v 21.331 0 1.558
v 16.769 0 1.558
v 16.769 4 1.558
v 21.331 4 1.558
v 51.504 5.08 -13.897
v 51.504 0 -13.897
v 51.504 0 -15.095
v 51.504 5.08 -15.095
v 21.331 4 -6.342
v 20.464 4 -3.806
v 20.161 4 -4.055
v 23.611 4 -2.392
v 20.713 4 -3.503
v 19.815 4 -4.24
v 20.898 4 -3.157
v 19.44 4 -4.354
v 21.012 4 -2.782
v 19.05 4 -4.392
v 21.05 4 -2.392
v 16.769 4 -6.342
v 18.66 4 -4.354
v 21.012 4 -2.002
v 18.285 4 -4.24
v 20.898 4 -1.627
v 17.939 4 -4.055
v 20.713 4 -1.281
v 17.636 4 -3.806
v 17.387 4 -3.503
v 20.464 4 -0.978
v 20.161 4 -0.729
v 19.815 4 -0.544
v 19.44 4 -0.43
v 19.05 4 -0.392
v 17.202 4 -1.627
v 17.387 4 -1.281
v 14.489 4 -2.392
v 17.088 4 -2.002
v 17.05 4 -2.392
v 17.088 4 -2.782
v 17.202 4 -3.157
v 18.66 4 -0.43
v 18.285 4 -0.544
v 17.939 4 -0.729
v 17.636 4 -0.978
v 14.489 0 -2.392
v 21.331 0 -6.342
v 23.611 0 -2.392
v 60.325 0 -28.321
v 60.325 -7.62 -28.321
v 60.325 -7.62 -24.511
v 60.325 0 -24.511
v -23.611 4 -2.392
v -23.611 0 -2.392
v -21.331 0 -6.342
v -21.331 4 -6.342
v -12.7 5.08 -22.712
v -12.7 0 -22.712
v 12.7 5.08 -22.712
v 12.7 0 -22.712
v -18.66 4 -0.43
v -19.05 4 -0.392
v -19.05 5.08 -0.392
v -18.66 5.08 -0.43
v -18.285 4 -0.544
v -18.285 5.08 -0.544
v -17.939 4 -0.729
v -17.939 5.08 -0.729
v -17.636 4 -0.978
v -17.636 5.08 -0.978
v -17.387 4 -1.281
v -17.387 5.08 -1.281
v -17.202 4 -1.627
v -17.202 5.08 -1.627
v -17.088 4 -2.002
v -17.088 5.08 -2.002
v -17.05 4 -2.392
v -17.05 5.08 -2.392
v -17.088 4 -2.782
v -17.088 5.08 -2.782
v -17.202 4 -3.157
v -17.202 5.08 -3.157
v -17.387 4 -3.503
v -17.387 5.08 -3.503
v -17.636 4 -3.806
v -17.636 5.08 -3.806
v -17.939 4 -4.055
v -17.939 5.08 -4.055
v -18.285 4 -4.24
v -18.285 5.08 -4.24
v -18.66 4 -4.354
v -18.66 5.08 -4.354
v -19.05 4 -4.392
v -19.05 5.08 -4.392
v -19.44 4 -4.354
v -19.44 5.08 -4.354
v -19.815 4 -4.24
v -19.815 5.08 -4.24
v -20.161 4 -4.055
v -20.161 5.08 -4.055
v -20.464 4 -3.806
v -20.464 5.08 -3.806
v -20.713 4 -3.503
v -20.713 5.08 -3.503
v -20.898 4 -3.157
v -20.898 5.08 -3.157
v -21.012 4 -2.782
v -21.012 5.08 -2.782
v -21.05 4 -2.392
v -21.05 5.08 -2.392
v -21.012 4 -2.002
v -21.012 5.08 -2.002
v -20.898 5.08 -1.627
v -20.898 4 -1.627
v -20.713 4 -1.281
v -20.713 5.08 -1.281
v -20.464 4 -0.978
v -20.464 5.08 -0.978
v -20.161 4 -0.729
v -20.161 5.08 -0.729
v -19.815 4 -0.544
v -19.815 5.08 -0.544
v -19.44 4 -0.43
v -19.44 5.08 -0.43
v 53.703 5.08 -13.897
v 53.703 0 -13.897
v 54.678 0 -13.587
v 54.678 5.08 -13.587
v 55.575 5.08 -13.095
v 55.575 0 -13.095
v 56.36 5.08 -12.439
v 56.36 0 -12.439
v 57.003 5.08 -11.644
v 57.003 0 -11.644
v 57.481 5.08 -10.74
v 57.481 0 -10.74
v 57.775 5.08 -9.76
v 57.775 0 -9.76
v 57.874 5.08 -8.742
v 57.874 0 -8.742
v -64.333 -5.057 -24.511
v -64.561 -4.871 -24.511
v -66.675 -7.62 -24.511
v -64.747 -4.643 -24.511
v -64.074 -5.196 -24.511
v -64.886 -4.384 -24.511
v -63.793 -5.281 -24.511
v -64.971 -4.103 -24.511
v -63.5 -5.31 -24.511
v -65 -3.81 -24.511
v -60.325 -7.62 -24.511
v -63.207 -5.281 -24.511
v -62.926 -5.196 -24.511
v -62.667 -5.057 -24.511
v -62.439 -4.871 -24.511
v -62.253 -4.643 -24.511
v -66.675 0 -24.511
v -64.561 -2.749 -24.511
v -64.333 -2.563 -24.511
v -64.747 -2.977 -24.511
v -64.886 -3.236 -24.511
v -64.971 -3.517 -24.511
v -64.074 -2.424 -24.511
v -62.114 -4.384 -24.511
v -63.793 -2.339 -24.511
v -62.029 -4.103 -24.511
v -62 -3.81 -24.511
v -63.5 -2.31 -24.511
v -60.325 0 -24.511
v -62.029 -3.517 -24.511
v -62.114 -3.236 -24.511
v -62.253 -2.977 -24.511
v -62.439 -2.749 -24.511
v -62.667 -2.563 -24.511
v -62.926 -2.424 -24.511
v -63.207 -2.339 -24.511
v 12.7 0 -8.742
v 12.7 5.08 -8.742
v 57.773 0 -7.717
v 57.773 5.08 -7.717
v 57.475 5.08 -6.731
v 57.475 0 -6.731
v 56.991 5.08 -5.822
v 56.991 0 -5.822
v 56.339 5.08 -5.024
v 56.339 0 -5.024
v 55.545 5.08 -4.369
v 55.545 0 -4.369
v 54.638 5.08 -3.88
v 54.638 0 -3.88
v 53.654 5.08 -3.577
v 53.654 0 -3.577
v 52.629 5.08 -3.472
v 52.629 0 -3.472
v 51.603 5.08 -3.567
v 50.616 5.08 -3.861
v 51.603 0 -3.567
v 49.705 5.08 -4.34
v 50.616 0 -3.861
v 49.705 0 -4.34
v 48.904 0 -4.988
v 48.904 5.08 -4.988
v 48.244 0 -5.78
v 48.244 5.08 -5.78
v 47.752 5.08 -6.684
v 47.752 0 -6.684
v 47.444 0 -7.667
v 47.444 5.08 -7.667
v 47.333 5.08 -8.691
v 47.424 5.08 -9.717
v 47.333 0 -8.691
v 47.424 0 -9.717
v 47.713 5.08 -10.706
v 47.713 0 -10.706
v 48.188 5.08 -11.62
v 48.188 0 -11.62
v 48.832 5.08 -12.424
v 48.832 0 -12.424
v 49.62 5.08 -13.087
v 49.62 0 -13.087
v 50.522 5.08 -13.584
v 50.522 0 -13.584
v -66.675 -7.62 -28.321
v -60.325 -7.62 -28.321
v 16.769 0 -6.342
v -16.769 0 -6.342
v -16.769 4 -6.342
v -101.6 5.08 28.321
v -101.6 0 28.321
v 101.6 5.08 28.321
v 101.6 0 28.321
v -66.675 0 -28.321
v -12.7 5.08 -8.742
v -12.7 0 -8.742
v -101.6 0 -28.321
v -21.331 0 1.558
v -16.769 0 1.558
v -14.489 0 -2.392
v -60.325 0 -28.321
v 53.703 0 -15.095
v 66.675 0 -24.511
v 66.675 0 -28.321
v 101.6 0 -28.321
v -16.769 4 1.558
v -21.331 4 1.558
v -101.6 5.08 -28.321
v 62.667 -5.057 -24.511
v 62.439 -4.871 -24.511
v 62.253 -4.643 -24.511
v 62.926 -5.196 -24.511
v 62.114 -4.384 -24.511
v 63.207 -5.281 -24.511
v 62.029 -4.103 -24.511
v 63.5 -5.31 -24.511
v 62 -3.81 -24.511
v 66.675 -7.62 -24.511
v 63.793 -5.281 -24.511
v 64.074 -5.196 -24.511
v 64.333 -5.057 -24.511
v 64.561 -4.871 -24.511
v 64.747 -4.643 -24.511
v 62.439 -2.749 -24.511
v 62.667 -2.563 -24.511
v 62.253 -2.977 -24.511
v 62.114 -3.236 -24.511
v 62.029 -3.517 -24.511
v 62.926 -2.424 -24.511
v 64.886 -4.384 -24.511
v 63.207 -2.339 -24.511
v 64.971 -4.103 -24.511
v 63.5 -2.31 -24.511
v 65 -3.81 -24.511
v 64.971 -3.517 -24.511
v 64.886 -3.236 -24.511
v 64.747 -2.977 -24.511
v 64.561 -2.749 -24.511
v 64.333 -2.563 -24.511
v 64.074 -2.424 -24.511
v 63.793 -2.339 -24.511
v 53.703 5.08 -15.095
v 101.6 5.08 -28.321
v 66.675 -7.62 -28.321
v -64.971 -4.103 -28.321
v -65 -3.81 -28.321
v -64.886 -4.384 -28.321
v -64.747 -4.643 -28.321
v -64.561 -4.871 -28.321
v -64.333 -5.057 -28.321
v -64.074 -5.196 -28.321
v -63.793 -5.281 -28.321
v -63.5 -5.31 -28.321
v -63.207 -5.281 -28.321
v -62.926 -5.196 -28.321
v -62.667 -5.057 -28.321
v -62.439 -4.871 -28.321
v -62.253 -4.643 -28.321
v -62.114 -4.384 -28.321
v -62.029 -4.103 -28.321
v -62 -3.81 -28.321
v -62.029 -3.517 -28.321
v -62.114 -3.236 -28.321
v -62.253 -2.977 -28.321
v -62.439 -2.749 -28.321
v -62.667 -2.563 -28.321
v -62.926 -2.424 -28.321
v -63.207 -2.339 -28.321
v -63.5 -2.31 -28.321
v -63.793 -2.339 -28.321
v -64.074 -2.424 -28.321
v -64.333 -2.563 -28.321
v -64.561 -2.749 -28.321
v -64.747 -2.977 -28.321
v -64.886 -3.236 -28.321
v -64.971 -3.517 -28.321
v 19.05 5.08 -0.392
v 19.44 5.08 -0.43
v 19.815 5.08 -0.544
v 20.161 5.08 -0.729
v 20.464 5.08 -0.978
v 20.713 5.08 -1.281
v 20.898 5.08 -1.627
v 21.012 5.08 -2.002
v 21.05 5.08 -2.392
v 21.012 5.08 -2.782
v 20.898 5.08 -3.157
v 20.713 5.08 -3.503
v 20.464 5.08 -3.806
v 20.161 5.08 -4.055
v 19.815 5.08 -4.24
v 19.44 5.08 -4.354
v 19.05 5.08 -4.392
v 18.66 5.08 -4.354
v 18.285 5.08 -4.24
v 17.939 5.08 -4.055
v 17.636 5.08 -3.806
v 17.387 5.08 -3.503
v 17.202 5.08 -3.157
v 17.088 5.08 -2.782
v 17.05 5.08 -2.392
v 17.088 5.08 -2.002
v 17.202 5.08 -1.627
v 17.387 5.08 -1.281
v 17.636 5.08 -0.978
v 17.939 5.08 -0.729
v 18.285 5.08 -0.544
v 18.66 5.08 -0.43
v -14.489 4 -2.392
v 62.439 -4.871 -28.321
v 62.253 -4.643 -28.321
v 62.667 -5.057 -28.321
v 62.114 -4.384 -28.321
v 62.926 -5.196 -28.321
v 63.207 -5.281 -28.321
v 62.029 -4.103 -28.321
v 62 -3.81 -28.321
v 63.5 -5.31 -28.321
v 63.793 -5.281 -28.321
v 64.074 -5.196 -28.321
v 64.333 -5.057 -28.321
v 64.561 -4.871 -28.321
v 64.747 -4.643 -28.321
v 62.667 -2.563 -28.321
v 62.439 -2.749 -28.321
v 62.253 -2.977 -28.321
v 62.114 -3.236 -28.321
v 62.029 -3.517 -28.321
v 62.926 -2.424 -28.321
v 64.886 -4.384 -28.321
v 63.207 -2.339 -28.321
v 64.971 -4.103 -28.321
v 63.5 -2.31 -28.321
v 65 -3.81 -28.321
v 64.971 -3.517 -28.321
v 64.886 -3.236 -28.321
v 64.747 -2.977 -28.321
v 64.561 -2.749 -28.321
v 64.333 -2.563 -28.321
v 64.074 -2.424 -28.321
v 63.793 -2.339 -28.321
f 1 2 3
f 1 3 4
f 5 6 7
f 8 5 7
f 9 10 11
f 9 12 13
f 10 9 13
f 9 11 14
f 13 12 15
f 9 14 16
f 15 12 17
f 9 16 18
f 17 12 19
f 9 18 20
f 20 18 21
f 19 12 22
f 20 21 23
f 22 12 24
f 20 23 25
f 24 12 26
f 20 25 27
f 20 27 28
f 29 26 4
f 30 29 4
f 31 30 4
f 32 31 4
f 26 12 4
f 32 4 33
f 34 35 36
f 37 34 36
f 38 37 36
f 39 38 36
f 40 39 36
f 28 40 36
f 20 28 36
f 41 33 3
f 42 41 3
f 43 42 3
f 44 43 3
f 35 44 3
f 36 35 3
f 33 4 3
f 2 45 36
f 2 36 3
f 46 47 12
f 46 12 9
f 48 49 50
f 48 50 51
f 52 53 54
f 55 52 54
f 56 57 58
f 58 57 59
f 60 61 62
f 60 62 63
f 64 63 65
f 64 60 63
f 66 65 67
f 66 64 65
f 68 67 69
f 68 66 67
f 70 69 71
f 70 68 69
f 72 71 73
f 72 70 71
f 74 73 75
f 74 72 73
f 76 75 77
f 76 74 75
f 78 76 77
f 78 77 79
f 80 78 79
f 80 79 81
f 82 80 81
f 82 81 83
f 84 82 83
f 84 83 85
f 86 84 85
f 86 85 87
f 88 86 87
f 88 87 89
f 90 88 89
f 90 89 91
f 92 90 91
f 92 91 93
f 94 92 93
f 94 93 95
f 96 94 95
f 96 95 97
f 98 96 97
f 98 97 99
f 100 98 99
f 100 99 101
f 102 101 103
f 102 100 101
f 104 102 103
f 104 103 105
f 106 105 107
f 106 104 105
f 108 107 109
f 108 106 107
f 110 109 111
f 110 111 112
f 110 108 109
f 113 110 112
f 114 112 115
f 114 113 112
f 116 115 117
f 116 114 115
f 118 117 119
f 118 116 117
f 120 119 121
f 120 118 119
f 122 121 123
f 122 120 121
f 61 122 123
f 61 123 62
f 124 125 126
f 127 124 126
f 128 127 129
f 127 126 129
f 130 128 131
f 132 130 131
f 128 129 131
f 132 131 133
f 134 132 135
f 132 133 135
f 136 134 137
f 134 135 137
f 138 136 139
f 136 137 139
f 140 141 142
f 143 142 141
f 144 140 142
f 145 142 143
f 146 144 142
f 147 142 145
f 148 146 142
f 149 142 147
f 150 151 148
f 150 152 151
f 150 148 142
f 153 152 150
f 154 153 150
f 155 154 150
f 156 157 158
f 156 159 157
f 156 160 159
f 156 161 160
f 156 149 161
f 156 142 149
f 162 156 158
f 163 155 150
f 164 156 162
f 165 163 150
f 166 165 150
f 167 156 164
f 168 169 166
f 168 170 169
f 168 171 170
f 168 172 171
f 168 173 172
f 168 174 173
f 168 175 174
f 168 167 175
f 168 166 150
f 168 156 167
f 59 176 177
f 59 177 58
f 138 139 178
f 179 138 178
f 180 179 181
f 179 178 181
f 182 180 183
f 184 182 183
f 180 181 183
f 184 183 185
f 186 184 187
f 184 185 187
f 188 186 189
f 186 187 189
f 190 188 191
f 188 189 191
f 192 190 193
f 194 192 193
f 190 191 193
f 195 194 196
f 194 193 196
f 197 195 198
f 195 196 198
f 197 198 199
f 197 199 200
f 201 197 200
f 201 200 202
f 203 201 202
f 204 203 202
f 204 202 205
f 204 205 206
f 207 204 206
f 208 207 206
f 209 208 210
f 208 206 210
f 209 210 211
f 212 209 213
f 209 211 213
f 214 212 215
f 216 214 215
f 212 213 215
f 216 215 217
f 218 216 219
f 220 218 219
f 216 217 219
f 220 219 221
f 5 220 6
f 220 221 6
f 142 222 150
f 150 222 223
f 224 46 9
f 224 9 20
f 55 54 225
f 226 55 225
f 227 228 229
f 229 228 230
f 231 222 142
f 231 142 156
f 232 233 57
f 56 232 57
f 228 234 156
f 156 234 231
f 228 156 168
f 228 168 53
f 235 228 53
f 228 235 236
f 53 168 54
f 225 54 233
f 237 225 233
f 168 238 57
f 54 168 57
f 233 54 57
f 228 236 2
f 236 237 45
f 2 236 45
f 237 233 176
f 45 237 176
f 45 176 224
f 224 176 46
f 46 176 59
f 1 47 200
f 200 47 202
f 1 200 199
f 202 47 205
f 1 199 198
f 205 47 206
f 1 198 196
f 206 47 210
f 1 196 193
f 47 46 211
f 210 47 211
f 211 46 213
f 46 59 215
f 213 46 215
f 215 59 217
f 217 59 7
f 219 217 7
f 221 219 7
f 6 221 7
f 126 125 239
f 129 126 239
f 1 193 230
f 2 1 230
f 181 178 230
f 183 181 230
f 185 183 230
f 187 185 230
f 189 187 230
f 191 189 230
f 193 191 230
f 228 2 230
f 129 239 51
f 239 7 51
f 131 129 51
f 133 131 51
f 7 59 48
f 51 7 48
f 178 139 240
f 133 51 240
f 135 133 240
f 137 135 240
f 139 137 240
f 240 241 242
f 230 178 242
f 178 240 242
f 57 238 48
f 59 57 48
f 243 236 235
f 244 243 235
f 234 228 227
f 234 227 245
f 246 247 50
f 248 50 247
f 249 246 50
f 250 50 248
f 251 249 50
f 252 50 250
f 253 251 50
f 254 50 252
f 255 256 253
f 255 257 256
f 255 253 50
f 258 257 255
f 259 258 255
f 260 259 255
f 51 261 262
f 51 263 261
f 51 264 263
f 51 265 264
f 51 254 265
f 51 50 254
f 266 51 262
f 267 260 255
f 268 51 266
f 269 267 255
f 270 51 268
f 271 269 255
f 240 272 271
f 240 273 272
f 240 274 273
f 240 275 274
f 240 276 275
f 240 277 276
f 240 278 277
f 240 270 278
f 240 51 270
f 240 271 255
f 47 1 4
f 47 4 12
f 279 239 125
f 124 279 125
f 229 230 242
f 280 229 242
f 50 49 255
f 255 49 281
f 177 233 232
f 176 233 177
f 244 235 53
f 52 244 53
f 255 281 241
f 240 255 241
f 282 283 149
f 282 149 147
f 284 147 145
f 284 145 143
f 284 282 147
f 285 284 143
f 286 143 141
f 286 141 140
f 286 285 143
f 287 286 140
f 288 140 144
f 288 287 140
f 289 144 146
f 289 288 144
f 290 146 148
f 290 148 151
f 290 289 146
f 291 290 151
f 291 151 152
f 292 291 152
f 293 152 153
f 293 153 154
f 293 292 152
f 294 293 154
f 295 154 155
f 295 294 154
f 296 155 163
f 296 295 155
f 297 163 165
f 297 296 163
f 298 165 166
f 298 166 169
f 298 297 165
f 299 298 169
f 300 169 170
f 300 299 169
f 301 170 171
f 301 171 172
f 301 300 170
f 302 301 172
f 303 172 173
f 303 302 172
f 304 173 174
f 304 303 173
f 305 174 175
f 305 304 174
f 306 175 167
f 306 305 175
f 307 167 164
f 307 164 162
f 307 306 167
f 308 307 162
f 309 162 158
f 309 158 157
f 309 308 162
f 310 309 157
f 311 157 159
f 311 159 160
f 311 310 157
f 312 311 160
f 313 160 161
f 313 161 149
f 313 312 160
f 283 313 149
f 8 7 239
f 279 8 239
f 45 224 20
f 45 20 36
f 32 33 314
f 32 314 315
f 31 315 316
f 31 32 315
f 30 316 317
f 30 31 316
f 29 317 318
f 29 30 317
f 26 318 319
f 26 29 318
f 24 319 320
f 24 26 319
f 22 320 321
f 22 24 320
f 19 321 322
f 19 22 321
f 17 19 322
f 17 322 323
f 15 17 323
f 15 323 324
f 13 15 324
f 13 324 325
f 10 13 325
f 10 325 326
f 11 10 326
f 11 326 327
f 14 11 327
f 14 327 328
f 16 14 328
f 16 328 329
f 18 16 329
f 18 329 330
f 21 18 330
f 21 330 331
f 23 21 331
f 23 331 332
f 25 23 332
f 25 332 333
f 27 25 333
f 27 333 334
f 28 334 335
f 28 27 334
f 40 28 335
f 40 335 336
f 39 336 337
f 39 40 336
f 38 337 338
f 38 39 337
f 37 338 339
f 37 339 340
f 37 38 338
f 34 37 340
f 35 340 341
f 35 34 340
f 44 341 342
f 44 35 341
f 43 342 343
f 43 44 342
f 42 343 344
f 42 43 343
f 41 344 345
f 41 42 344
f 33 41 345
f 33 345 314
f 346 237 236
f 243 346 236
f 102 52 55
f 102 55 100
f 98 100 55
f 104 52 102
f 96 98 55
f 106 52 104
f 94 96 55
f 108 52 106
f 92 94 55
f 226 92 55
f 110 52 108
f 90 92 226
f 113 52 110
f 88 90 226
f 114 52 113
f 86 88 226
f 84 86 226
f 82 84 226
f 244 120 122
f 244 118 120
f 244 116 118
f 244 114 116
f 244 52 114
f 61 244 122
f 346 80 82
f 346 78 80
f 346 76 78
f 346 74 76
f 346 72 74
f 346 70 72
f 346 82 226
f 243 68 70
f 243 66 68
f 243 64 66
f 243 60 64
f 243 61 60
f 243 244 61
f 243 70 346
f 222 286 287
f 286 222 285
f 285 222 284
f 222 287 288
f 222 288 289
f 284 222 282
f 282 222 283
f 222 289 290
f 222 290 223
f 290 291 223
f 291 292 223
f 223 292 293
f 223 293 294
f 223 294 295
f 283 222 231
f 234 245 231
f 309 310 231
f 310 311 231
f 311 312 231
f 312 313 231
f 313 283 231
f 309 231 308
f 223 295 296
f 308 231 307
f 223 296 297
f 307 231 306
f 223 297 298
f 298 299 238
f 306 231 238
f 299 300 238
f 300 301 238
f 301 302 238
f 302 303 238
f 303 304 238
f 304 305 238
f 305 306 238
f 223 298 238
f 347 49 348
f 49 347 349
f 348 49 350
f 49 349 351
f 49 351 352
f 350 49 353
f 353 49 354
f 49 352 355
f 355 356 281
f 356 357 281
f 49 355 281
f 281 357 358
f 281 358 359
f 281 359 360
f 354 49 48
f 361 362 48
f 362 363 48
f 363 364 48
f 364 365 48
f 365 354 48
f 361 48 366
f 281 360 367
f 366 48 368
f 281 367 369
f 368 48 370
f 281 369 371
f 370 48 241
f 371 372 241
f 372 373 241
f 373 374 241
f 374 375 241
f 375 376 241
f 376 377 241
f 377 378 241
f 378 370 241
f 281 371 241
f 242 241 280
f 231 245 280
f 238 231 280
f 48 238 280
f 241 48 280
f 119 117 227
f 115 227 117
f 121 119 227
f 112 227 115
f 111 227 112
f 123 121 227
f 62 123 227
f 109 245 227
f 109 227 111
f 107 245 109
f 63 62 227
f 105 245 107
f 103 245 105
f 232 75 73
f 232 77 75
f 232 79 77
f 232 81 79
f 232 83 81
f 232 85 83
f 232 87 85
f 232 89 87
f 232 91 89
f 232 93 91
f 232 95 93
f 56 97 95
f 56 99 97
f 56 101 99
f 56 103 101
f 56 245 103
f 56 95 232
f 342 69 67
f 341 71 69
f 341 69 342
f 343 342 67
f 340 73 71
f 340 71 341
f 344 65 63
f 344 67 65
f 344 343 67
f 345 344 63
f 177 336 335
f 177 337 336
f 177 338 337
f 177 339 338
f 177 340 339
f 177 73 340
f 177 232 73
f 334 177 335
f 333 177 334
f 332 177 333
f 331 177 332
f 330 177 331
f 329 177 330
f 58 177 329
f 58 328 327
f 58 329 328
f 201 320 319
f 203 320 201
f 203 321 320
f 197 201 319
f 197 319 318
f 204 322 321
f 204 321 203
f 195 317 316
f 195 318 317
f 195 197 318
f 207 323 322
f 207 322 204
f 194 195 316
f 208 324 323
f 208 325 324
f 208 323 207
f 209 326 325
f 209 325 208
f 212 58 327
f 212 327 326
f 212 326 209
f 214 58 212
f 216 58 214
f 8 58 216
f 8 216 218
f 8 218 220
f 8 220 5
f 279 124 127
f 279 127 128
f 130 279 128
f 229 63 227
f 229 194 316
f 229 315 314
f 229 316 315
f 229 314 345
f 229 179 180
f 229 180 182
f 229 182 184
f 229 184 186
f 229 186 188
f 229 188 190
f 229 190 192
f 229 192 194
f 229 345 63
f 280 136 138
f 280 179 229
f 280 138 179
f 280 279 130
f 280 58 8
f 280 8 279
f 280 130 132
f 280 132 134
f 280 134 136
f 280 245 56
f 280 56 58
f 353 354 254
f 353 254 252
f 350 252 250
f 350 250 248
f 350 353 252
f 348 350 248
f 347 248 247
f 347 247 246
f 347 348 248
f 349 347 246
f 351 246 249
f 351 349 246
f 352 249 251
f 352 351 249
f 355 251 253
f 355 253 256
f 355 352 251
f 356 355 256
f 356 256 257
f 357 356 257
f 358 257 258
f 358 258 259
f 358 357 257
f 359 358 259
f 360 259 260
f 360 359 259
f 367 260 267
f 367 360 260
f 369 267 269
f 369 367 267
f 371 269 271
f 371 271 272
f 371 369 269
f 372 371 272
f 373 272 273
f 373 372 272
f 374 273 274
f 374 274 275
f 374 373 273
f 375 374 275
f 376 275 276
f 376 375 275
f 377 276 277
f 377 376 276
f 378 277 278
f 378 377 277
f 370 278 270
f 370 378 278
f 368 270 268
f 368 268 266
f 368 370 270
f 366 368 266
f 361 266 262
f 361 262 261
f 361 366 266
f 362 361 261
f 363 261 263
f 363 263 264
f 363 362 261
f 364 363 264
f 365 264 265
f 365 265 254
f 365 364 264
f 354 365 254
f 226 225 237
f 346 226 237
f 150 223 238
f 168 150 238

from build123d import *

# Parameters (mm, degrees)
SKETCH2_W           = 203.2
SKETCH2_H           = 56.642
SKETCH2_R           = 2
SKETCH2_W_2         = 25.4
SKETCH2_H_2         = 13.97
BOSS_EXTRUDE1_DEPTH = 5.08
CUT_EXTRUDE1_DEPTH  = 4
BOSS_EXTRUDE2_START = -56.642
SKETCH5_W           = 6.35
SKETCH5_H           = 7.62
SKETCH5_R           = 1.5
SKETCH5_H_2         = 5.08
BOSS_EXTRUDE2_DEPTH = 3.81


with BuildPart() as part:
    # Sketch2 → Boss-Extrude1 (new body)
    with BuildSketch(Plane(origin=(0, 0, 0), x_dir=(1, 0, 0), z_dir=(0, 1, 0))):
        Rectangle(SKETCH2_W, SKETCH2_H)
        with Locations(Location((-19.05, 2.392044149, 0), (0, 0, 270))):
            Circle(SKETCH2_R, mode=Mode.SUBTRACT)
        with Locations((0, 15.727044149)):
            Rectangle(SKETCH2_W_2, SKETCH2_H_2, mode=Mode.SUBTRACT)
        with Locations(Location((19.05, 2.392044149, 0), (0, 0, 270))):
            Circle(SKETCH2_R, mode=Mode.SUBTRACT)
        with BuildLine():
            Line((51.503794476, 13.896514657), (51.503794476, 15.095394657))
            Line((51.503794476, 15.095394657), (53.703434476, 15.095394657))
            Line((53.703434476, 15.095394657), (53.703434476, 13.896514657))
            ThreePointArc((53.703434476, 13.896514657), (56.700855716, 12.057279355), (57.874114476, 8.742044149))
            ThreePointArc((57.874114476, 8.742044149), (49.28837927, 4.644802909), (51.503794476, 13.896514657))
        make_face(mode=Mode.SUBTRACT)
    extrude(amount=BOSS_EXTRUDE1_DEPTH)

    # Sketch4 → Cut-Extrude1 (cut)
    with BuildSketch(Plane.XZ):
        Polygon((-16.769466437, -6.342044149), (-14.488932873, -2.392044149), (-16.769466437, 1.557955851), (-21.330533563, 1.557955851), (-23.611067127, -2.392044149), (-21.330533563, -6.342044149), align=None)
        Polygon((16.769466437, -6.342044149), (14.488932873, -2.392044149), (16.769466437, 1.557955851), (21.330533563, 1.557955851), (23.611067127, -2.392044149), (21.330533563, -6.342044149), align=None)
    extrude(amount=-CUT_EXTRUDE1_DEPTH, mode=Mode.SUBTRACT)

    # Sketch5 → Boss-Extrude2 (add)
    # profile 1 of 4: a face of its own
    with BuildSketch(Plane.XY.offset(28.321).offset(BOSS_EXTRUDE2_START)):
        with Locations((-63.5, -3.81)):
            Rectangle(SKETCH5_W, SKETCH5_H)
        with Locations(Location((-63.5, -3.81, 0), (0, 0, 180))):
            Circle(SKETCH5_R, mode=Mode.SUBTRACT)
    # profile 2 of 4: a face of its own
    with BuildSketch(Plane.XY.offset(28.321).offset(BOSS_EXTRUDE2_START)):
        with Locations((-63.5, 2.54)):
            Rectangle(SKETCH5_W, SKETCH5_H_2)
    # profile 3 of 4: a face of its own
    with BuildSketch(Plane.XY.offset(28.321).offset(BOSS_EXTRUDE2_START)):
        with Locations((63.5, 2.54)):
            Rectangle(SKETCH5_W, SKETCH5_H_2)
    # profile 4 of 4: a face of its own
    with BuildSketch(Plane.XY.offset(28.321).offset(BOSS_EXTRUDE2_START)):
        with Locations((63.5, -3.81)):
            Rectangle(SKETCH5_W, SKETCH5_H)
        with Locations(Location((63.5, -3.81, 0), (0, 0, 180))):
            Circle(SKETCH5_R, mode=Mode.SUBTRACT)
    extrude(amount=BOSS_EXTRUDE2_DEPTH)


solid = part.part
